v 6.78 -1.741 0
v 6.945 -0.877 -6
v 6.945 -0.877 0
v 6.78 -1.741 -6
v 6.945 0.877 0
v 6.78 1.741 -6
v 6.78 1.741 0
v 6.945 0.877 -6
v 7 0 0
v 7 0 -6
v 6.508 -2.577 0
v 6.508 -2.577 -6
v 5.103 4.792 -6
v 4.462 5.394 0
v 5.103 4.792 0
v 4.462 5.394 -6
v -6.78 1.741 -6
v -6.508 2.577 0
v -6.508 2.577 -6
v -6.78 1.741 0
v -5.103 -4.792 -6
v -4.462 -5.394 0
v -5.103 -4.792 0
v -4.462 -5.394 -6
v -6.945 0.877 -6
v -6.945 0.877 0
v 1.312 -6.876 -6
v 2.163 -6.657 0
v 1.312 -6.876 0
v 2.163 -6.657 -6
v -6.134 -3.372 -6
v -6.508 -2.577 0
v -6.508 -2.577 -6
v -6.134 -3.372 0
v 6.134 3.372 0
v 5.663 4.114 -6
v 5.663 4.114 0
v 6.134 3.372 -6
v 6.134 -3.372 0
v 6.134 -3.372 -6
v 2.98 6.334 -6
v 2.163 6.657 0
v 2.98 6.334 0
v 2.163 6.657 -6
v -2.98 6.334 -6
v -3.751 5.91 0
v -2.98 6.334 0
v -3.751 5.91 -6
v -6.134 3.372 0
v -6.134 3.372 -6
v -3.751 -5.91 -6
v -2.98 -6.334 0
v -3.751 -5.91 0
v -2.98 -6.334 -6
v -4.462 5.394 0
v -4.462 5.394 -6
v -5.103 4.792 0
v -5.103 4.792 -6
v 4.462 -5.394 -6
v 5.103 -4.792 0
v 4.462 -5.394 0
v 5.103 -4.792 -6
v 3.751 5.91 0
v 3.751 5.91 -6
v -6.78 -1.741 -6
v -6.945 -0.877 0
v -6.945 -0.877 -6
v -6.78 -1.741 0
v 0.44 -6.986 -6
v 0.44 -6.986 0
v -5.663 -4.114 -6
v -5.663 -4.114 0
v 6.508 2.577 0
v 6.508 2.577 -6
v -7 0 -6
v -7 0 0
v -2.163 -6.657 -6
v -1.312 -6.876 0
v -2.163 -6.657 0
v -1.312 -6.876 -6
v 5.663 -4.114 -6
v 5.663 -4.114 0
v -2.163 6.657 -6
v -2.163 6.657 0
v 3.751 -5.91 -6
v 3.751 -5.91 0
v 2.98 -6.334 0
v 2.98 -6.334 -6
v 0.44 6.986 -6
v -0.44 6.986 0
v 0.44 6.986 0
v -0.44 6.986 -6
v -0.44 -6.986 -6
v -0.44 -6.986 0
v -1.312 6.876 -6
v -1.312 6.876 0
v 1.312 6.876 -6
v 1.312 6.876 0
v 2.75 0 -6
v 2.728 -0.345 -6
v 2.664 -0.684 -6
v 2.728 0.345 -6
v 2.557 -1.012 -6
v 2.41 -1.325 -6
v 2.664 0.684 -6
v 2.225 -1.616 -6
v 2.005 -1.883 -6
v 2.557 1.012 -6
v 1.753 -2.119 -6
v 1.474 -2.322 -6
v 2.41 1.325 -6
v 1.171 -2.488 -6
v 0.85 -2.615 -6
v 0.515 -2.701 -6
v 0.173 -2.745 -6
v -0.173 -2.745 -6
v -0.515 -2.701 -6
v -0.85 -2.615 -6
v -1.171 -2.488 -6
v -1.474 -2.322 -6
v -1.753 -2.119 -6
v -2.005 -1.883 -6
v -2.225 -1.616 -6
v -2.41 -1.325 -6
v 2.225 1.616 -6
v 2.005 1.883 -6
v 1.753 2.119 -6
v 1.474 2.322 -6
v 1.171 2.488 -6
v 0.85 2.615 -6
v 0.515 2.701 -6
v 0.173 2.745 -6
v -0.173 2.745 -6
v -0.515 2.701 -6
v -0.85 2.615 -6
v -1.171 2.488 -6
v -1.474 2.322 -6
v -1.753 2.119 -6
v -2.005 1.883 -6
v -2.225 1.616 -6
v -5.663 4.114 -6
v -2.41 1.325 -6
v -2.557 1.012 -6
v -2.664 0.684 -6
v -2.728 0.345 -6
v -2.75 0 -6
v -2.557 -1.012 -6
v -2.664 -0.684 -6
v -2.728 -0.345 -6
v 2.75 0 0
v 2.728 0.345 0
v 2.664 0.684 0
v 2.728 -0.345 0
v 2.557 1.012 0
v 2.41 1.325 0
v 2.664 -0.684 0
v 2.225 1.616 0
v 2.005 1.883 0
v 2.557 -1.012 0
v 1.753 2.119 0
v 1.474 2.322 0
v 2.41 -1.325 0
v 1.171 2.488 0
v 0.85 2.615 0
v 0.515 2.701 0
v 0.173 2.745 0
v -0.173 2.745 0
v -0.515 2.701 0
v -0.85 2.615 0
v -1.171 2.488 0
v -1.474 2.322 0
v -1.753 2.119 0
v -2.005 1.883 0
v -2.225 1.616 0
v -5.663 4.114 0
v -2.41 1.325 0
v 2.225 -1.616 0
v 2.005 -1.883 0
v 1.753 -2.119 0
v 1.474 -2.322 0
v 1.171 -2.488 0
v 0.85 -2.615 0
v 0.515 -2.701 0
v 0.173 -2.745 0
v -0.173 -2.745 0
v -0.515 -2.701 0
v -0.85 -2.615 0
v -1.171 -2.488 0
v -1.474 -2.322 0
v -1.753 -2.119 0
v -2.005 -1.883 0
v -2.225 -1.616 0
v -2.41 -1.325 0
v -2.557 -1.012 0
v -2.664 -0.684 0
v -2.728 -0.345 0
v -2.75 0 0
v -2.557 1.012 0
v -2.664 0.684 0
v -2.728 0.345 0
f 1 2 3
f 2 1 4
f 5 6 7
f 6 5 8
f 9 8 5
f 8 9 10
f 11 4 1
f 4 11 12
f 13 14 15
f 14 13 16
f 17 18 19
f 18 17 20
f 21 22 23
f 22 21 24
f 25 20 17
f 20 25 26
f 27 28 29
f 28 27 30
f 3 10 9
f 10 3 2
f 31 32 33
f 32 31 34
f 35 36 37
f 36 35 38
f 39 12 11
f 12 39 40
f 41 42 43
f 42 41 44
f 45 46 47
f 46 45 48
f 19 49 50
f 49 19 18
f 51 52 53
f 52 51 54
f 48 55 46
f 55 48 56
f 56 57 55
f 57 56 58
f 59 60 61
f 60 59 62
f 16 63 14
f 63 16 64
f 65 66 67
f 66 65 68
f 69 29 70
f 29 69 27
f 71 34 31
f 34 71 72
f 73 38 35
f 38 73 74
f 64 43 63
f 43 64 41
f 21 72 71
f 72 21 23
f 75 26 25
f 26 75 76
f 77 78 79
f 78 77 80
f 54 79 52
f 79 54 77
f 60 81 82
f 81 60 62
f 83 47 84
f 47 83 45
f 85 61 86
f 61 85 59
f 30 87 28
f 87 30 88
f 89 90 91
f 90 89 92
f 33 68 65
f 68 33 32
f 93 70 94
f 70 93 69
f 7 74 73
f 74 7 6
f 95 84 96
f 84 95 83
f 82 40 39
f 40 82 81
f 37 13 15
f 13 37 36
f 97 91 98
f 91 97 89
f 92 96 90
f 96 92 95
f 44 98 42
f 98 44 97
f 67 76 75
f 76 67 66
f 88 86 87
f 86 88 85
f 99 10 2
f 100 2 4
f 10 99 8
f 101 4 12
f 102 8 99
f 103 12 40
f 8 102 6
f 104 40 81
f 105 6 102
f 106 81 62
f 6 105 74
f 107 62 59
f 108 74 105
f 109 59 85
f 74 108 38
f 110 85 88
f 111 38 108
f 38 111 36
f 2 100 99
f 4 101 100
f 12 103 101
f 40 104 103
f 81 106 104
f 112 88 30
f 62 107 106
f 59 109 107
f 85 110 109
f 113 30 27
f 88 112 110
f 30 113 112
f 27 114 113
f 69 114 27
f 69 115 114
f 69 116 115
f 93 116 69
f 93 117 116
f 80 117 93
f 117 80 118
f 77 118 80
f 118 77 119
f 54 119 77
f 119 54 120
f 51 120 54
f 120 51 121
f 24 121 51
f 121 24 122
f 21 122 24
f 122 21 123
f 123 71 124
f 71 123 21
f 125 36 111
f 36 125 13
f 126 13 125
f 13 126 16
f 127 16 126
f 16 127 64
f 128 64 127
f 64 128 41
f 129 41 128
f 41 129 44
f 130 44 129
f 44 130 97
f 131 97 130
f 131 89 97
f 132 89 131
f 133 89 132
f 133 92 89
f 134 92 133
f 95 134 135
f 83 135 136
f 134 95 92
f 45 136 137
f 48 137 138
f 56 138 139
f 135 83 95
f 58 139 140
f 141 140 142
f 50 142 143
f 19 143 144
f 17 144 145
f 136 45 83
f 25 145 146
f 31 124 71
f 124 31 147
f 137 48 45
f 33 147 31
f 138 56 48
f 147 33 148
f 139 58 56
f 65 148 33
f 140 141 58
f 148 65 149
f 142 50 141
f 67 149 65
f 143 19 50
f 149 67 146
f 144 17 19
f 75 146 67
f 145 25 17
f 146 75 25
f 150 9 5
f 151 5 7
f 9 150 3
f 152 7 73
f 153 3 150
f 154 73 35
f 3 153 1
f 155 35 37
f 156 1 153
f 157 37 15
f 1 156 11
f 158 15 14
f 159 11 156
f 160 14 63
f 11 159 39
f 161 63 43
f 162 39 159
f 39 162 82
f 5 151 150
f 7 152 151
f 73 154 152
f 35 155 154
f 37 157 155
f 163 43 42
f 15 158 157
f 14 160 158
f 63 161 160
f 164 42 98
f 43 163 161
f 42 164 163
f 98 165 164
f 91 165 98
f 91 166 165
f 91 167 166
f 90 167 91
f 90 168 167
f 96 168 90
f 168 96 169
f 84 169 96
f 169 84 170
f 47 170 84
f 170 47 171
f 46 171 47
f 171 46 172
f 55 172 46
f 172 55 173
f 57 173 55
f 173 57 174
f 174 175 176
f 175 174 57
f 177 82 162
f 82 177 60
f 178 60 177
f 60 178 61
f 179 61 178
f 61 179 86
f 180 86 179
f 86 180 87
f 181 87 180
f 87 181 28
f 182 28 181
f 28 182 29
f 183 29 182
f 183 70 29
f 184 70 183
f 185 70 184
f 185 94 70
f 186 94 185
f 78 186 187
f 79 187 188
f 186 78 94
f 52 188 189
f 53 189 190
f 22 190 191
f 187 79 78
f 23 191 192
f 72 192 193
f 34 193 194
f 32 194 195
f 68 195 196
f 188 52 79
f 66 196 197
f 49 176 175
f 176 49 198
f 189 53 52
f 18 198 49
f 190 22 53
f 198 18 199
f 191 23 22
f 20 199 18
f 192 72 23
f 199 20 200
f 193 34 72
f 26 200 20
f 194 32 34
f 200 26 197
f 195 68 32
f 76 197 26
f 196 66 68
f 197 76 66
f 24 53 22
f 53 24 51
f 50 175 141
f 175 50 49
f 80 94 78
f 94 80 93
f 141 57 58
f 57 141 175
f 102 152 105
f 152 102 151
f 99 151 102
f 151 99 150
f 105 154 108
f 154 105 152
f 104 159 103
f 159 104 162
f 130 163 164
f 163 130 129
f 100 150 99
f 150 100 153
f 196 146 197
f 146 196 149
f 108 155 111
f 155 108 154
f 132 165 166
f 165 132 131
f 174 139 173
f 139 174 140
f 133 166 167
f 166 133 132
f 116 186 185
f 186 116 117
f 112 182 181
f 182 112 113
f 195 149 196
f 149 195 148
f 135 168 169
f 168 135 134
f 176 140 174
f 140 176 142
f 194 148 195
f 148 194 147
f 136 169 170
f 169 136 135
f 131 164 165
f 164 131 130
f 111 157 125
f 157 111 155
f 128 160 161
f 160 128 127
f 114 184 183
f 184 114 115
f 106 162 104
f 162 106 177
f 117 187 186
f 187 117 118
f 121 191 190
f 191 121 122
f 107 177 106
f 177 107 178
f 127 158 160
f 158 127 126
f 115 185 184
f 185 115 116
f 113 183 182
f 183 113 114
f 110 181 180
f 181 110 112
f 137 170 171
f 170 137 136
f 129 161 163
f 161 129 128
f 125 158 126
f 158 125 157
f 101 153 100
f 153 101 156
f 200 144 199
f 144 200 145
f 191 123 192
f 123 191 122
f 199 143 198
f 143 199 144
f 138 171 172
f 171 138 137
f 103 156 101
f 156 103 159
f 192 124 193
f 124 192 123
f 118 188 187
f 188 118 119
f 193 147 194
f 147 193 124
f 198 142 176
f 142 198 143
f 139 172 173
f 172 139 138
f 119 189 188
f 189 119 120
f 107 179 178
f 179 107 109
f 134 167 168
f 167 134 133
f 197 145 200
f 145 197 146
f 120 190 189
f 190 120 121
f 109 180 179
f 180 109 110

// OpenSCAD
$fn = 50;


difference() {
	union() {
		translate(v = [0, 0, -6.0000000000]) {
			cylinder(h = 6, r = 7.0000000000);
		}
		cylinder(h = 0, r = 16.0000000000);
	}
	union() {
		#translate(v = [0, 0, -6]) {
			cylinder(h = 6, r = 2.7500000000);
		}
	}
}
